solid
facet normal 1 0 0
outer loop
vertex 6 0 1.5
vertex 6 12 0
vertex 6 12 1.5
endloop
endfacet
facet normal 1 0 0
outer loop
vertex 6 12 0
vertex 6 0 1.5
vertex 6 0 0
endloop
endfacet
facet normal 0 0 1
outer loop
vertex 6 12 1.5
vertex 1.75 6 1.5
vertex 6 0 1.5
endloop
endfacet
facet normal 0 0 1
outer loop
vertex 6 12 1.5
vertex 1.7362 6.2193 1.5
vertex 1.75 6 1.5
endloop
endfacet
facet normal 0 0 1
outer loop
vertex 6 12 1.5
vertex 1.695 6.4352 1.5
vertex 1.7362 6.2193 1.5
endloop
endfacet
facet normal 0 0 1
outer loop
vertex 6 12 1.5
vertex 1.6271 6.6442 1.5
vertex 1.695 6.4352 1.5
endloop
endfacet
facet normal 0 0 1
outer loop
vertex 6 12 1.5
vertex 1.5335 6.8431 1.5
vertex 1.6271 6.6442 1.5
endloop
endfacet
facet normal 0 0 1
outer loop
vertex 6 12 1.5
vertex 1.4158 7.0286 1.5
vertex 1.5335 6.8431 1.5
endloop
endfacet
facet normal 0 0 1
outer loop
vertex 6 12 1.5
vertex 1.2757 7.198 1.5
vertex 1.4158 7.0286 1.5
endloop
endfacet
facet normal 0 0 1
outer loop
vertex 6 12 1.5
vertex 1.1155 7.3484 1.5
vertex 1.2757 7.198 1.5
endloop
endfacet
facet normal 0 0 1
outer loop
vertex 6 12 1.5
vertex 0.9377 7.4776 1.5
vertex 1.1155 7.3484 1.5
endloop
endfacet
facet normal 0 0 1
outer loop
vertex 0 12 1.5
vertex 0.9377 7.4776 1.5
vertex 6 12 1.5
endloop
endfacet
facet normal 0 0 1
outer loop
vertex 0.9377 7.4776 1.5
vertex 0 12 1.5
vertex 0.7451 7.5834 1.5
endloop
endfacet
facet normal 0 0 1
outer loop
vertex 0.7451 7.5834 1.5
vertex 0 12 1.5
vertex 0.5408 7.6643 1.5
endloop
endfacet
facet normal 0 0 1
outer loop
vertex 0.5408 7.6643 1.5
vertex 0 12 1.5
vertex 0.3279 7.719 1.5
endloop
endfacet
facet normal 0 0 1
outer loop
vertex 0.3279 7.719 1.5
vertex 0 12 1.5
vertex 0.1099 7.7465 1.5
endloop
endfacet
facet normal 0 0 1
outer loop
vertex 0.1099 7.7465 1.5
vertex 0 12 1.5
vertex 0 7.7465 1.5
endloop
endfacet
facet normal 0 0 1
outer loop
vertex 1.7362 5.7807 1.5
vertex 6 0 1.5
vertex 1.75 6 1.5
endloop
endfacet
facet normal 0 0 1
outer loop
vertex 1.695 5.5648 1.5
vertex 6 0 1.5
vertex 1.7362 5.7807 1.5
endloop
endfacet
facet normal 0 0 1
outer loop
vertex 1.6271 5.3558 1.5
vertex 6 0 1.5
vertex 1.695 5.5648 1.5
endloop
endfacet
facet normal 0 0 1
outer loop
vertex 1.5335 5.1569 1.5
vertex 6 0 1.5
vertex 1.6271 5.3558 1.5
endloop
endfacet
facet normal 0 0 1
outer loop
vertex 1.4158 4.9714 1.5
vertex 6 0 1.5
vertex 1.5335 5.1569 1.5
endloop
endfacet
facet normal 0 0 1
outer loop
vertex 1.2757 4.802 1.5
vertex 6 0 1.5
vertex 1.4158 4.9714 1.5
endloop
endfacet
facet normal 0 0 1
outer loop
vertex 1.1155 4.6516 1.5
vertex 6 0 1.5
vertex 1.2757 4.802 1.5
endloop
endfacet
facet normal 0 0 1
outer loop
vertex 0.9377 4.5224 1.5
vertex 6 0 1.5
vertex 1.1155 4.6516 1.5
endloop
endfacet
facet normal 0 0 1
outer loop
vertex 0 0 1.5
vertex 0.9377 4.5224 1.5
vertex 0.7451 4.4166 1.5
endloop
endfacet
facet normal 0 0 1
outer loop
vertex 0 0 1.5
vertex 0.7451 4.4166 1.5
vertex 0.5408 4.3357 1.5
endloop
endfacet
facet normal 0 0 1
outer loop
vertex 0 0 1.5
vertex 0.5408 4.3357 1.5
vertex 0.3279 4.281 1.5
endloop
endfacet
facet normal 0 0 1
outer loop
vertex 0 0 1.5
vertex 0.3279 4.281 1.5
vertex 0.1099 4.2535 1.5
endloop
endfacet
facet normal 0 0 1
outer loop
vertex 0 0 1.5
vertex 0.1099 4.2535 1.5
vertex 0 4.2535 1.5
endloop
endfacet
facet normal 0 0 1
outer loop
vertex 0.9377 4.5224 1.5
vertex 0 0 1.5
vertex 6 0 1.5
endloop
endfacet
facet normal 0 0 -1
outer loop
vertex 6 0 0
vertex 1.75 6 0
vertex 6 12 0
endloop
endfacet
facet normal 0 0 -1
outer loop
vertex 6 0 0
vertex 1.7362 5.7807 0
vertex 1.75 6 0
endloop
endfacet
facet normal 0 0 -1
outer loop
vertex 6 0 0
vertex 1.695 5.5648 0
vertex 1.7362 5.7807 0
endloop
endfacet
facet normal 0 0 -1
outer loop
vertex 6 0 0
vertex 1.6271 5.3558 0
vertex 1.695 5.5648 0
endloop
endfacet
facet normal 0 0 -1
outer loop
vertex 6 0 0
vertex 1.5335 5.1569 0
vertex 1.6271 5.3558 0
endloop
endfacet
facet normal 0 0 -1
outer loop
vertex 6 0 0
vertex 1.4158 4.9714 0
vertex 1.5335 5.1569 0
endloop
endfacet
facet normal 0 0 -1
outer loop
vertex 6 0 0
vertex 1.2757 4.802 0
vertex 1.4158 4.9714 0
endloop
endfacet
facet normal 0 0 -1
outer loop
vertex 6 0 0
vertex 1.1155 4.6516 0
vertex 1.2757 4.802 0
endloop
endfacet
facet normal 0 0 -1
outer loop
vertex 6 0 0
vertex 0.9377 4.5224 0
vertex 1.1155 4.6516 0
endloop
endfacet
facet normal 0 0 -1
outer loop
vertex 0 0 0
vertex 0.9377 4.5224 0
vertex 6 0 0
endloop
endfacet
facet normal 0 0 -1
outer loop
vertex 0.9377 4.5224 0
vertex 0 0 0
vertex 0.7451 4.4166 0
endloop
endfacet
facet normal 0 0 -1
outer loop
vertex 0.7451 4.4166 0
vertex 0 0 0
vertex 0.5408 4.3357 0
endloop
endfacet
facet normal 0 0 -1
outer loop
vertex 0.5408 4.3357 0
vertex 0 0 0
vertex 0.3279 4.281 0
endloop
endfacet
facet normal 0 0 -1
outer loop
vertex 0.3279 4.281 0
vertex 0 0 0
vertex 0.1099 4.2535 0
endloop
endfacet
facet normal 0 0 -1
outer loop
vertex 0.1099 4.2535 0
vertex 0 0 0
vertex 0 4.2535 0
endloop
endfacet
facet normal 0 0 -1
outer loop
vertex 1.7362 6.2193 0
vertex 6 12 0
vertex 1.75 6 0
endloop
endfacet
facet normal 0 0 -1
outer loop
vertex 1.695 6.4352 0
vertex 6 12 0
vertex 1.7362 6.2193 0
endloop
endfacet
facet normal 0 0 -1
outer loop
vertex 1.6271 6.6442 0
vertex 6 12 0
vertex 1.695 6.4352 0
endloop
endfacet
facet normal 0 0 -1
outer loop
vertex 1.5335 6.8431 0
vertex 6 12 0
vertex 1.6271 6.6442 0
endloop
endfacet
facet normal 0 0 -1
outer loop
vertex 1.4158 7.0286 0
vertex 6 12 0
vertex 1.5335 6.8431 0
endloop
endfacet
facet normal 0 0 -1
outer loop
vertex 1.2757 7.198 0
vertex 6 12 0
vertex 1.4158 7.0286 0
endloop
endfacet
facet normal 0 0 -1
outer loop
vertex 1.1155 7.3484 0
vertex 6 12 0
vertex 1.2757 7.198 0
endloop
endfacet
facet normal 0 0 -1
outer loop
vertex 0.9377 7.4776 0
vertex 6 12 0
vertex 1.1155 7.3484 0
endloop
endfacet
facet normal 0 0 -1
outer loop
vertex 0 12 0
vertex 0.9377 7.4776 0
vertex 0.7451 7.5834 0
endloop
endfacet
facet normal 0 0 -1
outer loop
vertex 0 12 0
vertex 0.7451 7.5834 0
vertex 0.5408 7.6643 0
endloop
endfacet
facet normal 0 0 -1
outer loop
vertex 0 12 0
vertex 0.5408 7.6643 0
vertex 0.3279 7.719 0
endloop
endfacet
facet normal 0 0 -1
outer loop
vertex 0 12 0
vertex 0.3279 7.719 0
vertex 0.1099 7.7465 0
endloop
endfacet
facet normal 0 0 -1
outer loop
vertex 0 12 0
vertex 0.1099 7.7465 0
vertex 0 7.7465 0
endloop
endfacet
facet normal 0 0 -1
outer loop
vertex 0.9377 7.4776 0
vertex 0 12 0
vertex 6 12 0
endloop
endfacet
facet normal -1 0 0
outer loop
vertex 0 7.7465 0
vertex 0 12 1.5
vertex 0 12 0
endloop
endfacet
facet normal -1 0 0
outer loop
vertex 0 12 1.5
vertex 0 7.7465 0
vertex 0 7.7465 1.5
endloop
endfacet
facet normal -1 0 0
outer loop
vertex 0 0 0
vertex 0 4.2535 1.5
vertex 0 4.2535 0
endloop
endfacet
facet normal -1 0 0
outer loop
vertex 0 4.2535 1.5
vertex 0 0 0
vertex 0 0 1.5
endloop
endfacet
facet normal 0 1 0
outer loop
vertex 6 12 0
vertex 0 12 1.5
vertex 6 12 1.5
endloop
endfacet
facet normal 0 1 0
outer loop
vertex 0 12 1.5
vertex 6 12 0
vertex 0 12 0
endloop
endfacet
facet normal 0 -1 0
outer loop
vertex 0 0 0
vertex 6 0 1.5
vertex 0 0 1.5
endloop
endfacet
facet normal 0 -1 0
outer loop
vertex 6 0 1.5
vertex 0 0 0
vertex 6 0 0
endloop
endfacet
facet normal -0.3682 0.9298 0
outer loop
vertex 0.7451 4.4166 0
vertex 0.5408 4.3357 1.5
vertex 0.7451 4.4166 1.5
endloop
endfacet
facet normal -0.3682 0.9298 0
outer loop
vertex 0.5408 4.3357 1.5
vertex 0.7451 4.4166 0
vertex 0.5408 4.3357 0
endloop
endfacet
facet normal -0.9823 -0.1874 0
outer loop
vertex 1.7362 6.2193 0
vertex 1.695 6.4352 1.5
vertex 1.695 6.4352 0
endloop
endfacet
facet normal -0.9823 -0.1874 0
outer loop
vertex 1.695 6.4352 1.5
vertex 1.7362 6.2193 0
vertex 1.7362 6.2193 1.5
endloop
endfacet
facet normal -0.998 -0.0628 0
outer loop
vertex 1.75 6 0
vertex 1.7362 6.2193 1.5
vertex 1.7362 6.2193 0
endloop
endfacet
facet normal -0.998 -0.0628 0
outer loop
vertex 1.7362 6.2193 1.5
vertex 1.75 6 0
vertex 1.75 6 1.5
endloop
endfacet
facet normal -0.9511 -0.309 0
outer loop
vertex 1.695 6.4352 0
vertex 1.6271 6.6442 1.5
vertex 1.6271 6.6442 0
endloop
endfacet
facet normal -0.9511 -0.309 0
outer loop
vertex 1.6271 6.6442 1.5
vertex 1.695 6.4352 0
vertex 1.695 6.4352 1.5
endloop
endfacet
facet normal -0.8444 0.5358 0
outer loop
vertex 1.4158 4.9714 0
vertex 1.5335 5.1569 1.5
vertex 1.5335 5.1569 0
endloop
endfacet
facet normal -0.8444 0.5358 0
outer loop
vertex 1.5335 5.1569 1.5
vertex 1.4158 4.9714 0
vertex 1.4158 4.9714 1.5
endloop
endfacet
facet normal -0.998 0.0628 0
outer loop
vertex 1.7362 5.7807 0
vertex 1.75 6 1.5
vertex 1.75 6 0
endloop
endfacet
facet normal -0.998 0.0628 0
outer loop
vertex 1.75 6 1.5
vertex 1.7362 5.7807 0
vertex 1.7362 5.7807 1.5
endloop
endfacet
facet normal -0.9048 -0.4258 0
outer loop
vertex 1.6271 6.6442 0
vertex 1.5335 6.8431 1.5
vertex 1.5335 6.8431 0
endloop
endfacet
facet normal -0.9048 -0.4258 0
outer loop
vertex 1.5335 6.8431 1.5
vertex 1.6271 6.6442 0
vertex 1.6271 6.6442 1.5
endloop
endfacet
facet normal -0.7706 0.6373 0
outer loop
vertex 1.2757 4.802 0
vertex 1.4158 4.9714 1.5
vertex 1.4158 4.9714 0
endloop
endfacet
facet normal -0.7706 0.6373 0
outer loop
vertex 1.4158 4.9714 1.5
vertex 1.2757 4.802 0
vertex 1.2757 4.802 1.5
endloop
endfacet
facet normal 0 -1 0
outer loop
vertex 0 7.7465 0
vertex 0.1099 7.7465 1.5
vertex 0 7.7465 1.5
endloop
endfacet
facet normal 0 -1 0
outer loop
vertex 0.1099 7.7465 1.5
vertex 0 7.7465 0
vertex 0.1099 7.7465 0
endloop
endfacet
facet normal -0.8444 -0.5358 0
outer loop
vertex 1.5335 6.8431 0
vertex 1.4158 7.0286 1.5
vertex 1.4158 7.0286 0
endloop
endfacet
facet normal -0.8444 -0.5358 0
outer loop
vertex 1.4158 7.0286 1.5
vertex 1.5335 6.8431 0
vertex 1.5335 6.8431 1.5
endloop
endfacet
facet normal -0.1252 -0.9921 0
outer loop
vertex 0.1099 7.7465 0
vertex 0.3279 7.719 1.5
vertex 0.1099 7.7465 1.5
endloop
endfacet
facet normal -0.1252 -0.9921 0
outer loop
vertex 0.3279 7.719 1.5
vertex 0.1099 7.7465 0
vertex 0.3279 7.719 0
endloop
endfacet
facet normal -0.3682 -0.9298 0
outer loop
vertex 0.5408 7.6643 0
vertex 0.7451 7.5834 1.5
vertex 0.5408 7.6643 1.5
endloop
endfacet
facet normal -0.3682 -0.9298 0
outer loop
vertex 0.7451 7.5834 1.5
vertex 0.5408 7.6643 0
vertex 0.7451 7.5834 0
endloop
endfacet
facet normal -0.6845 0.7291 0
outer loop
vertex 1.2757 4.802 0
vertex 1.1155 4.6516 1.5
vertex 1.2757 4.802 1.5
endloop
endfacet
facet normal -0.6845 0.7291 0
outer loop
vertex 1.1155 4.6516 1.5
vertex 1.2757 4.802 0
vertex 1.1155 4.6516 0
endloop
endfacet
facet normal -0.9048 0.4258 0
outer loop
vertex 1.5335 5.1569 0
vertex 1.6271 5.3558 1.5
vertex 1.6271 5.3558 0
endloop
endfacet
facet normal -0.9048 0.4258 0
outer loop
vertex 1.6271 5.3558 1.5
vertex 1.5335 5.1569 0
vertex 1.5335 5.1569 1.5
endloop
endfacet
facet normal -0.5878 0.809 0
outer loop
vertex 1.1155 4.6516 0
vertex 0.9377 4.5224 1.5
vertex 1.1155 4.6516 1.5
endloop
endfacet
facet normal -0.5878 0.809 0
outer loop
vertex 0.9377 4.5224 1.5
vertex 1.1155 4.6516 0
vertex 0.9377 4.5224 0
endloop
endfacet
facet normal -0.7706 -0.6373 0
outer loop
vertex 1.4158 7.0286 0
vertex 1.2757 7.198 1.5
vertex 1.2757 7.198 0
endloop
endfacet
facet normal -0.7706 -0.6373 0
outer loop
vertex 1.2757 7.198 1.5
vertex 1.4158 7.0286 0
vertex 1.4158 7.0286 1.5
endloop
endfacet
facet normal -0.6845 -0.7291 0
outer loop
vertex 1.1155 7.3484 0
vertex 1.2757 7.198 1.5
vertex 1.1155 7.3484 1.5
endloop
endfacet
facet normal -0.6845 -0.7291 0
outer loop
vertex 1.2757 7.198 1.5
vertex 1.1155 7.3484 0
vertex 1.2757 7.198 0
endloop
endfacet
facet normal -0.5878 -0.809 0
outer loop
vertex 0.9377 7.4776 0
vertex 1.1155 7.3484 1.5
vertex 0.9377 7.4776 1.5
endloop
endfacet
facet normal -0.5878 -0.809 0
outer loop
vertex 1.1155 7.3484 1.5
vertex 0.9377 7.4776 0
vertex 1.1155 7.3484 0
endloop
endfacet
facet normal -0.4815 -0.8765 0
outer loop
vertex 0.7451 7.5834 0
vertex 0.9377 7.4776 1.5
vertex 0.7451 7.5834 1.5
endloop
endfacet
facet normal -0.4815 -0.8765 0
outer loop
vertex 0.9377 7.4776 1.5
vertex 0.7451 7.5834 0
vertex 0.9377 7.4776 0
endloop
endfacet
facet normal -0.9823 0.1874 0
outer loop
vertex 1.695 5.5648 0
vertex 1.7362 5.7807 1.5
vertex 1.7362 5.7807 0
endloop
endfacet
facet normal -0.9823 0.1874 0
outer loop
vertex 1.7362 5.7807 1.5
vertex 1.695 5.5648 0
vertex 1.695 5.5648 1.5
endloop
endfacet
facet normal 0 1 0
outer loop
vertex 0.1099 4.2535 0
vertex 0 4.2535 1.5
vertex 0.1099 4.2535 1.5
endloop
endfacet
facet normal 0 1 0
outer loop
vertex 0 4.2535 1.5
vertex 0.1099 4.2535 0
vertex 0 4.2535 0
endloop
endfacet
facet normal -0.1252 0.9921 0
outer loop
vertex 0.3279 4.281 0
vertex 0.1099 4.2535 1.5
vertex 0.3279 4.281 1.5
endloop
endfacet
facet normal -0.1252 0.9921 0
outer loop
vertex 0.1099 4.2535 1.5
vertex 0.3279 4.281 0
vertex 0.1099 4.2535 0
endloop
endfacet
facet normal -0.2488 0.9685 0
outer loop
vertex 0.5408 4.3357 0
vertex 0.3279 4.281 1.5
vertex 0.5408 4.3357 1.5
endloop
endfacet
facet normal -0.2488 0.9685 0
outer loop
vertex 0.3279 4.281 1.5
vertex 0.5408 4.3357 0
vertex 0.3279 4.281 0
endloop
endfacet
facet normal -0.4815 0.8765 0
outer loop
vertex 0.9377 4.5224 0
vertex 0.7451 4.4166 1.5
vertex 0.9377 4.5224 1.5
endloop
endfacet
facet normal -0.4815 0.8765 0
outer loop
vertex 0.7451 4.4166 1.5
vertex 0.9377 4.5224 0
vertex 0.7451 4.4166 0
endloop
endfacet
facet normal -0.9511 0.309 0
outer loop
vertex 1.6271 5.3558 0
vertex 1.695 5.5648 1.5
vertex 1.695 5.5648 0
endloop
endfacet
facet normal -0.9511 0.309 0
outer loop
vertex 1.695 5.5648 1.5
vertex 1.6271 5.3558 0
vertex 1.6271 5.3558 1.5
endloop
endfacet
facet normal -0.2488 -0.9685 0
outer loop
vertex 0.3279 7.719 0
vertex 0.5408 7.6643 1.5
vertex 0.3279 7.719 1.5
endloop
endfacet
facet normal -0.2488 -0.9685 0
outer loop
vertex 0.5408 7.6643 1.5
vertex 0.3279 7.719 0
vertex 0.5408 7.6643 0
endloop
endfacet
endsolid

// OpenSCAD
difference(){
cube([6.0,12,1.5]);

translate([0,6,-1])
    cylinder(d=3.5,10,$fn=50);
}
